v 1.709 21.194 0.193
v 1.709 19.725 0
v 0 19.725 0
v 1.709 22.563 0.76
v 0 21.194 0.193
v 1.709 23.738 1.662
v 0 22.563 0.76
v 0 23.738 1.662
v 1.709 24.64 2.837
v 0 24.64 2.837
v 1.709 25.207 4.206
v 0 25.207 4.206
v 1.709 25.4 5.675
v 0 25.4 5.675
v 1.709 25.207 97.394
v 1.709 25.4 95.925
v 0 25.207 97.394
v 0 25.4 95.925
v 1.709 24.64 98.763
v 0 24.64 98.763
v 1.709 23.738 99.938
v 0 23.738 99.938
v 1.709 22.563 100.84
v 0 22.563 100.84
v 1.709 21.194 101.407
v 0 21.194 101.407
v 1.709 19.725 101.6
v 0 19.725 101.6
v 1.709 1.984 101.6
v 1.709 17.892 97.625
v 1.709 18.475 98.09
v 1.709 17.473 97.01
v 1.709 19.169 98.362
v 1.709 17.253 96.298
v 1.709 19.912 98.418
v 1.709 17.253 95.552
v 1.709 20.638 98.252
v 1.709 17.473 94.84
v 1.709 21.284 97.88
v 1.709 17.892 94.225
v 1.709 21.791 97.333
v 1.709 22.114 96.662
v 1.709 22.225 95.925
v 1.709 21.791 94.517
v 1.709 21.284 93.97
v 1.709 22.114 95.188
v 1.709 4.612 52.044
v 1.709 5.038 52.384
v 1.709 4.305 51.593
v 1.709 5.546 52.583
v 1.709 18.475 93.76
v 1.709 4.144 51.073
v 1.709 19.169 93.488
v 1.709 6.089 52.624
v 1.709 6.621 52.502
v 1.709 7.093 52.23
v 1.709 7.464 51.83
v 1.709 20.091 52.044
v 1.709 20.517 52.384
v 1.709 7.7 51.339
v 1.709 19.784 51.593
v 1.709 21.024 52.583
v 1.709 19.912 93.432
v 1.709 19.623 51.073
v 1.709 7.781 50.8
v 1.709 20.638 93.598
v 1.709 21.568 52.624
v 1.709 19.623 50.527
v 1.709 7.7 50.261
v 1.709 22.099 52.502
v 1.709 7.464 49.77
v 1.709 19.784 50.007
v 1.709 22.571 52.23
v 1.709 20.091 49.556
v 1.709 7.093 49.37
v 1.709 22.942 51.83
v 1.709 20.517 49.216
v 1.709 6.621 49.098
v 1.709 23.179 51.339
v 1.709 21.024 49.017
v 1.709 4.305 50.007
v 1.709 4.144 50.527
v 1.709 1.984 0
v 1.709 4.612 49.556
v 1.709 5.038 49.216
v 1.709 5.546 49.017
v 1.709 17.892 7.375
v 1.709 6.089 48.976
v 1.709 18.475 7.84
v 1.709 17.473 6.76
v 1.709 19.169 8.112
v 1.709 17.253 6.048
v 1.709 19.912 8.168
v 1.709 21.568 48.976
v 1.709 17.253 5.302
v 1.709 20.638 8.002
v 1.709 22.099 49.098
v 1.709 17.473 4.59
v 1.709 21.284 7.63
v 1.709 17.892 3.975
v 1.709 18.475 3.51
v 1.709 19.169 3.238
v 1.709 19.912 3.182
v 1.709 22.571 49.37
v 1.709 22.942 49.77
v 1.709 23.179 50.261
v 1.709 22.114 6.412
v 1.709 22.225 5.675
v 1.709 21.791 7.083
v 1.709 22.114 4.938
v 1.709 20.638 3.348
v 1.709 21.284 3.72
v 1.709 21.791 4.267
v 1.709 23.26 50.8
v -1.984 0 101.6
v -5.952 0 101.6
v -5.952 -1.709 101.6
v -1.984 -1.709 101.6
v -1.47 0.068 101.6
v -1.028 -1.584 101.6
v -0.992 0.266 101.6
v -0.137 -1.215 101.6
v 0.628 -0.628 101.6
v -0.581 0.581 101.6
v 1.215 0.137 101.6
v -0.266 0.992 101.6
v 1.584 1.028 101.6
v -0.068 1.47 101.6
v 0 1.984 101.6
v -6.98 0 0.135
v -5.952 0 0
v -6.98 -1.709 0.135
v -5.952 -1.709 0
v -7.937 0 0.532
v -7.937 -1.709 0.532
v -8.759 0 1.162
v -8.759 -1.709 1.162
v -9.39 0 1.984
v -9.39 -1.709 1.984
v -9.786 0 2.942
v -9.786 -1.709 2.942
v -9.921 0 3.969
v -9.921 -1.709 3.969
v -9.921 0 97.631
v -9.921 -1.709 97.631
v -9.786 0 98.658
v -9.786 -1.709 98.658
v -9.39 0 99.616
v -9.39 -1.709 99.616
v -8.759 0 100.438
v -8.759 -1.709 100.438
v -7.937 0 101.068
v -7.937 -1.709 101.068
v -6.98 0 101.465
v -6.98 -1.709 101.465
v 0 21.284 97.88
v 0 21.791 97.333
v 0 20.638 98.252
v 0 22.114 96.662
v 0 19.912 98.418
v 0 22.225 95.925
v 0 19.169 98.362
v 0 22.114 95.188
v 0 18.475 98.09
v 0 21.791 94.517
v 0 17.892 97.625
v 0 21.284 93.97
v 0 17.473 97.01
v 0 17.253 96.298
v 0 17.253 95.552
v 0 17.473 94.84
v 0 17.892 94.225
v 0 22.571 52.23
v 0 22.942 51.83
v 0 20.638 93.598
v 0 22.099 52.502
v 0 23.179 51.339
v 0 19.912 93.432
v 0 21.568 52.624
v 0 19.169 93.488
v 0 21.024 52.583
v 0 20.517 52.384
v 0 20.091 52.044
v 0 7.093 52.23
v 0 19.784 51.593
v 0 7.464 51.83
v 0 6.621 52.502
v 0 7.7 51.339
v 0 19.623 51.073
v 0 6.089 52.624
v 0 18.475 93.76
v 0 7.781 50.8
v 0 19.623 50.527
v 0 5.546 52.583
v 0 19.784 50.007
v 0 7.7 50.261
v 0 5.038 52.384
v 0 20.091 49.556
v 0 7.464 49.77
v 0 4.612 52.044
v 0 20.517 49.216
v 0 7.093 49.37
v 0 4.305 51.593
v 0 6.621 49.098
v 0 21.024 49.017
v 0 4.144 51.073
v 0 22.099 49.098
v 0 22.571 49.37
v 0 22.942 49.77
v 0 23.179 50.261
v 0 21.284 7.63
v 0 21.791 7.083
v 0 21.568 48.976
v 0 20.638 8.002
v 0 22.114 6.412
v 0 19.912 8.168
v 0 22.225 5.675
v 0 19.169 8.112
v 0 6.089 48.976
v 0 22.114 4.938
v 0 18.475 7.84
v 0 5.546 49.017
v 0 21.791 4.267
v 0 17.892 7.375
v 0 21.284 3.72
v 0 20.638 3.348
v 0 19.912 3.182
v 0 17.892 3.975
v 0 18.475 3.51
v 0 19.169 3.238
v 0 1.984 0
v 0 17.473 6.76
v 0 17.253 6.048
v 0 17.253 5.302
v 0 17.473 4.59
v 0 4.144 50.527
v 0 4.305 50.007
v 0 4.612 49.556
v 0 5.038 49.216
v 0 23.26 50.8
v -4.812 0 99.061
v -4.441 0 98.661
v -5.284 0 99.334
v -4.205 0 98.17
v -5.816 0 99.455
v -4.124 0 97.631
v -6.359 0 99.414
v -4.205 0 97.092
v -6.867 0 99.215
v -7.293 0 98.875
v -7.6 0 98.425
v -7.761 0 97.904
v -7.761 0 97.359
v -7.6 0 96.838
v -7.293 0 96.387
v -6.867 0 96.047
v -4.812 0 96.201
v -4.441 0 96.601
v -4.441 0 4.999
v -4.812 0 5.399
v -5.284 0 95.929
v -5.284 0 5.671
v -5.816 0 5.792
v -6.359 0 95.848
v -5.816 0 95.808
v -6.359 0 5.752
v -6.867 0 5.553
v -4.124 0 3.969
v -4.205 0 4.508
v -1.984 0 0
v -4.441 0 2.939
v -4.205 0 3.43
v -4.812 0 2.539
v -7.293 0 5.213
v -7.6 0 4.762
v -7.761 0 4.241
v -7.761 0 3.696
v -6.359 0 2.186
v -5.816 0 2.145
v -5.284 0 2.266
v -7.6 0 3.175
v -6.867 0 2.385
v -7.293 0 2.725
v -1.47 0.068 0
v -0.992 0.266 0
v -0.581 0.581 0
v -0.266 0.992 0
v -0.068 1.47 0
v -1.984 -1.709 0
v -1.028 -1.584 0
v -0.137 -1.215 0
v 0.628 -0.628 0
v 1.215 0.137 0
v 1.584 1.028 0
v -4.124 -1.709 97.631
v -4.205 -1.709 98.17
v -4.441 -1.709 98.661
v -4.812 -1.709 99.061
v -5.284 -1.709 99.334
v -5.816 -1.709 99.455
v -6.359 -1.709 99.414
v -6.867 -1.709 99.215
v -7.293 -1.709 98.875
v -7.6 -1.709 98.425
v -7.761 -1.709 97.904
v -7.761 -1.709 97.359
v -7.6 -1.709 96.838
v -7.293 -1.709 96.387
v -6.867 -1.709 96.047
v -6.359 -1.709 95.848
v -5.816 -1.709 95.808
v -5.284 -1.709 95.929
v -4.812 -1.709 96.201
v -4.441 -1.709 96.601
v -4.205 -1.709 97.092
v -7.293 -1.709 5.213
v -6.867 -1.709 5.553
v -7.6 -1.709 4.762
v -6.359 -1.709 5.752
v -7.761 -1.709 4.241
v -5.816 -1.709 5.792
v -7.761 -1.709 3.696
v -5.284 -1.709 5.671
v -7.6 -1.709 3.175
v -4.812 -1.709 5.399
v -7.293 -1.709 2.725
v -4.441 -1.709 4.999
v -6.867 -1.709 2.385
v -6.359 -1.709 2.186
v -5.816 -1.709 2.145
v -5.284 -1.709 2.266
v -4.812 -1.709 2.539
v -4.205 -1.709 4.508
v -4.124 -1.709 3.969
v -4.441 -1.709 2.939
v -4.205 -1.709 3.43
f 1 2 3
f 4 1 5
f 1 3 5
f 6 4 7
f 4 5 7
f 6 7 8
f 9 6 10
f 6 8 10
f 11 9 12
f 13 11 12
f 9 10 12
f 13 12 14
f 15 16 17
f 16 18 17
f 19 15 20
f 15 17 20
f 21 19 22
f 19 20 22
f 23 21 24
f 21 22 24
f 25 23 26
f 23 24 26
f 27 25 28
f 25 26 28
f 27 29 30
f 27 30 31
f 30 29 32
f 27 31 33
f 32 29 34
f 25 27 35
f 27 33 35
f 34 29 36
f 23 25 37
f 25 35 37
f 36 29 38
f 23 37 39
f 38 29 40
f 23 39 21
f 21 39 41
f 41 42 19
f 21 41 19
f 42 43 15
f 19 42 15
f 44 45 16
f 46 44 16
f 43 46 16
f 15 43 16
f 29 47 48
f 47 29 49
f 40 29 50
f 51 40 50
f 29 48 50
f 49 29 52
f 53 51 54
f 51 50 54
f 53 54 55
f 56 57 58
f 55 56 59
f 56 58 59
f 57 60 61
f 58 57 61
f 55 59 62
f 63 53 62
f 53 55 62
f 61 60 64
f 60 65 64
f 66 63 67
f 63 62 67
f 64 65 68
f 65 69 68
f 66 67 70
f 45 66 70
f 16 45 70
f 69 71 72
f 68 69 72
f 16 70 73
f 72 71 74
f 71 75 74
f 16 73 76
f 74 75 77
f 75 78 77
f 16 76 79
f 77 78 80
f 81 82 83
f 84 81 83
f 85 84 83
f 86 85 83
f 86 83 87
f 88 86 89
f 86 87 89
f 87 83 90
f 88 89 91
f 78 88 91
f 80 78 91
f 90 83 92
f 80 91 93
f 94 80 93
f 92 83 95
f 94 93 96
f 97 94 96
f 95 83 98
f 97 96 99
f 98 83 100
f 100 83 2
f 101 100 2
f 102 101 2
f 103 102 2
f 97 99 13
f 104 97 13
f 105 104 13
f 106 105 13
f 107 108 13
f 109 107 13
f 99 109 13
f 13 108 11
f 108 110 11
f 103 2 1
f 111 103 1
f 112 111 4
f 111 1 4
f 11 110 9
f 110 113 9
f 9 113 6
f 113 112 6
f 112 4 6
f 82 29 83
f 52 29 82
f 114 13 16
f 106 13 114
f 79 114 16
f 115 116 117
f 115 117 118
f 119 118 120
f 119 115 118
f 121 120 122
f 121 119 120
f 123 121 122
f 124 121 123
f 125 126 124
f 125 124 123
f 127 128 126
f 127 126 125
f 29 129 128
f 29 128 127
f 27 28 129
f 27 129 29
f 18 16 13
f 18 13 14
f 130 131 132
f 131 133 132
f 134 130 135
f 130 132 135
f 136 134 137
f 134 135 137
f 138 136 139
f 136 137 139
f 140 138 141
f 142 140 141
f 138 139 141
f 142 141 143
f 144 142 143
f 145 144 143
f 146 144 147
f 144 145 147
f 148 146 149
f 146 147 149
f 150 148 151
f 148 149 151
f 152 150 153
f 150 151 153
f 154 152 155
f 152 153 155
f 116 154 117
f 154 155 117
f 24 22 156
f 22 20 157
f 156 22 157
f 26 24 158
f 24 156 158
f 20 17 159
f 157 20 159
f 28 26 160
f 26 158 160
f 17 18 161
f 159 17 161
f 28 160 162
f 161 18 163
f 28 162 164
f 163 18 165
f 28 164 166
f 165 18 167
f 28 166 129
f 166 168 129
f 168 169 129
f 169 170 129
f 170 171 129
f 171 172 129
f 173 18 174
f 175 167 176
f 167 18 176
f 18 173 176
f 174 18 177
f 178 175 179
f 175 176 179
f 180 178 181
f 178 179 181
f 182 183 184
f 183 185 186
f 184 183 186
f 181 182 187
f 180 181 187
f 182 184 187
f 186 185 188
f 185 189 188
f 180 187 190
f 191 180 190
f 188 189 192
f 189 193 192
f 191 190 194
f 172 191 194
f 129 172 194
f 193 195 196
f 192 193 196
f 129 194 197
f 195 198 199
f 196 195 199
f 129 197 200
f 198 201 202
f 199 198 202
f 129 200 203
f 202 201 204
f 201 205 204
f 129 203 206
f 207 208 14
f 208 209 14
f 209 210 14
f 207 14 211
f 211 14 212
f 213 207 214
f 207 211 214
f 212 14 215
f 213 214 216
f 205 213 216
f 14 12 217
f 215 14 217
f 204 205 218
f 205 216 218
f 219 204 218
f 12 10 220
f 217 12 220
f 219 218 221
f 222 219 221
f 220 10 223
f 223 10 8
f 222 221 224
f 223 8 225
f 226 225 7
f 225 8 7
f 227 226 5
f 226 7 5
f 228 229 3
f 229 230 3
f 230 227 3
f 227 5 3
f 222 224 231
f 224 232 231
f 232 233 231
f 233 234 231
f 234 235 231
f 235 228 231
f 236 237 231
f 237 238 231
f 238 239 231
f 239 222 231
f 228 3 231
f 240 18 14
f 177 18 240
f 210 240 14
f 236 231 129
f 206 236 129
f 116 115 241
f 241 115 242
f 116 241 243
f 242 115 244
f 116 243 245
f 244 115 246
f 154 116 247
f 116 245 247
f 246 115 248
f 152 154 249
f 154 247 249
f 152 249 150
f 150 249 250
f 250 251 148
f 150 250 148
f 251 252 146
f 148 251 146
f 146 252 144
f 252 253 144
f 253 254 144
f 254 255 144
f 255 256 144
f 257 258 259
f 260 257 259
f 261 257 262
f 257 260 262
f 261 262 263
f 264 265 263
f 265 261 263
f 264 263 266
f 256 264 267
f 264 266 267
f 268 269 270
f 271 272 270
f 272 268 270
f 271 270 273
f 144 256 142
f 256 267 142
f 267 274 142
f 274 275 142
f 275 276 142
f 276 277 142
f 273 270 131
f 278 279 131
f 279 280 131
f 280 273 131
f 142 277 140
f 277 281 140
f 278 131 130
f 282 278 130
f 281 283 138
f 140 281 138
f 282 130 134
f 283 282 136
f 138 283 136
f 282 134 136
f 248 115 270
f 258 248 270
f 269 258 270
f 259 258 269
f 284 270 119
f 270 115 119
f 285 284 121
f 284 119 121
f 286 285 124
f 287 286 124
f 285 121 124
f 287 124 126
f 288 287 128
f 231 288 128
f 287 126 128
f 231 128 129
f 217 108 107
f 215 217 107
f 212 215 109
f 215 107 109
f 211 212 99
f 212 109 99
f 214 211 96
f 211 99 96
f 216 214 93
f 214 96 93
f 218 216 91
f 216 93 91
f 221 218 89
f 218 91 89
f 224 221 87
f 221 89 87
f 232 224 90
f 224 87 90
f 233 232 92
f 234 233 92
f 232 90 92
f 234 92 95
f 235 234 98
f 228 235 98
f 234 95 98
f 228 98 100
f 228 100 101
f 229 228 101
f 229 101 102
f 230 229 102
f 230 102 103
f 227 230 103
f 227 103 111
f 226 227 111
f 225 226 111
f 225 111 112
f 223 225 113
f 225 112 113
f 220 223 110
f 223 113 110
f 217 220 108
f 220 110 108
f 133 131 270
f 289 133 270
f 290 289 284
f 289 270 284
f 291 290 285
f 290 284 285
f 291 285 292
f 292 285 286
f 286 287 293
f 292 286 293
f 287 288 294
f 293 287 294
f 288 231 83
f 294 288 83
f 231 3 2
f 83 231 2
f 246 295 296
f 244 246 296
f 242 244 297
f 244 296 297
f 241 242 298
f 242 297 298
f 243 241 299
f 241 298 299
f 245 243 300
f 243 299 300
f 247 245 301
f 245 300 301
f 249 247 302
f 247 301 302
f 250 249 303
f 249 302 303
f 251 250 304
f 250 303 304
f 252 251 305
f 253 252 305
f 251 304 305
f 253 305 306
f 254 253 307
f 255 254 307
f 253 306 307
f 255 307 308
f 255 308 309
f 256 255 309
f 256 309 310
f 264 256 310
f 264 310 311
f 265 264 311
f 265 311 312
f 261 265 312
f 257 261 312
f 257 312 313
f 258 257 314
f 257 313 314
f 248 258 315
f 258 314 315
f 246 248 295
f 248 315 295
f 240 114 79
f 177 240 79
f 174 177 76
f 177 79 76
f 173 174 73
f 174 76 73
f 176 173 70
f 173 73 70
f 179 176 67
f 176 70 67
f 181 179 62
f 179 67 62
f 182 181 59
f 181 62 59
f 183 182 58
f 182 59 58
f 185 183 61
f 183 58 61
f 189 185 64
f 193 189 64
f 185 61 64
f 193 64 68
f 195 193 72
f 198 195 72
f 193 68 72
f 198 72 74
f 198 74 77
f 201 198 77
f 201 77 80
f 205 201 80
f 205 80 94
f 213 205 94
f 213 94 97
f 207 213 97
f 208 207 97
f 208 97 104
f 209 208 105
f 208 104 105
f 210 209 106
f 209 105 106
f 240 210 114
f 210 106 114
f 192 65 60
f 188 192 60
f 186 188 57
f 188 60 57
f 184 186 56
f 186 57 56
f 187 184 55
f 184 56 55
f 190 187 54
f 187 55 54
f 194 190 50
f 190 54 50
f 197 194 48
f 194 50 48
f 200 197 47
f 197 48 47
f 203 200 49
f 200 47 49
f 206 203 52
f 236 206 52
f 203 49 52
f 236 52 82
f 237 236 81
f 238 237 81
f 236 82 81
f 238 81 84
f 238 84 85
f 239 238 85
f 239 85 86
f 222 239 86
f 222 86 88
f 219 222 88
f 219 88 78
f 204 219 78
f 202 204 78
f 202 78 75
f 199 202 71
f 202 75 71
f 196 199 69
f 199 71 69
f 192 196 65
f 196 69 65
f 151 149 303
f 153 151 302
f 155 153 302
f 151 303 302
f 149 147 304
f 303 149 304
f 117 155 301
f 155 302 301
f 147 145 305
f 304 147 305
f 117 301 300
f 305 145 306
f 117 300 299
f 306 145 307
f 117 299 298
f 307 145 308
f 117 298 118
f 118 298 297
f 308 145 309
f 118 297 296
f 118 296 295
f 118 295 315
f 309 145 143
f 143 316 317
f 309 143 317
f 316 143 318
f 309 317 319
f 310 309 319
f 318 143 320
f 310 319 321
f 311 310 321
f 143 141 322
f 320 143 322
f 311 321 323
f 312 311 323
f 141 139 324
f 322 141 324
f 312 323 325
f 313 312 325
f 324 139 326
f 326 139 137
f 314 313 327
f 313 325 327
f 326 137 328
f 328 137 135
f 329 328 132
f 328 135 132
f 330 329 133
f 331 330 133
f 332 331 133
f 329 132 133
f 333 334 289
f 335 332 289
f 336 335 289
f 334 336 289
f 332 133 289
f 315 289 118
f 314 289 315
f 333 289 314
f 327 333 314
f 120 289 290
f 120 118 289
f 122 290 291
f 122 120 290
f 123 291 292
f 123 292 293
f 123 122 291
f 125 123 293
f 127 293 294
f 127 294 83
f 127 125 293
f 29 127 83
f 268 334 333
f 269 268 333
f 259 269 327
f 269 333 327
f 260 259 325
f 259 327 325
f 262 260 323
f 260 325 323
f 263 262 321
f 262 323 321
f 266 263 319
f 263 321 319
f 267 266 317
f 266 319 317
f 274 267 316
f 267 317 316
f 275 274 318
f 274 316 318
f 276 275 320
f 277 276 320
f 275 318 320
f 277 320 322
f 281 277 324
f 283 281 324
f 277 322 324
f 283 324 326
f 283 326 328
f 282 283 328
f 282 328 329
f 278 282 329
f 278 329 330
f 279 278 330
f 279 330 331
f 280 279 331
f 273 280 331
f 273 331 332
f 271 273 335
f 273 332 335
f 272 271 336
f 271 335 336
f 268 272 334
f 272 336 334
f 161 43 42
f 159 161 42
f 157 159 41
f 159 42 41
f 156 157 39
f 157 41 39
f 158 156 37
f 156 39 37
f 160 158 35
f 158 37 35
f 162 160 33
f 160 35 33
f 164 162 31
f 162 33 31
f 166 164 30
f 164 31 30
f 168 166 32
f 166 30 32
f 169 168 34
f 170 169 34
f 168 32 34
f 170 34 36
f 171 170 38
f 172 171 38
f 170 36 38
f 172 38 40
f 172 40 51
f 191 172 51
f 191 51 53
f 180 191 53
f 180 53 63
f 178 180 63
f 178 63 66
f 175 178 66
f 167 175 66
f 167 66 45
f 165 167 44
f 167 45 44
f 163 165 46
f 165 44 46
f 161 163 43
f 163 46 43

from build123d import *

# Parameters (mm, degrees)
F1_DEPTH = 101.6
F2_R     = 3.69316
F3_R     = 1.98374
F4_R     = 1.8288
F4_R_2   = 2.5
F5_DEPTH = 1.70942
F6_R     = 5.674995
F7_R     = 3.96875
F8_R     = 1.8288
F9_DEPTH = 1.70942


with BuildPart() as f1:
    # F0 (on Top) → F1 (new body)
    with BuildSketch(Plane.XY):
        Polygon((0, 25.4), (0, 0), (-9.92124, 0), (-9.92124, -1.70942), (1.70942, -1.70942), (1.70942, 25.4), align=None)
    extrude(amount=F1_DEPTH)

    # F2
    f2_edges = [f1.edges().sort_by_distance(p)[0] for p in [
        (1.70942, -1.70942, 50.8),
    ]]
    fillet(f2_edges, radius=F2_R)

    # F3
    f3_edges = [f1.edges().sort_by_distance(p)[0] for p in [
        (0, 0, 50.8),
    ]]
    fillet(f3_edges, radius=F3_R)

    # F4 (on face) → F5 (cut, through all)
    with BuildSketch(Plane.YZ.offset(1.70942)):
        with Locations((21.43125, 50.8)):
            Circle(F4_R)
        with Locations((5.95249, 50.8)):
            Circle(F4_R)
        with Locations((19.725, 95.925)):
            Circle(F4_R_2)
        with Locations((19.725, 5.675)):
            Circle(F4_R_2)
    extrude(amount=-F5_DEPTH, mode=Mode.SUBTRACT)

    # F6
    f6_edges = [f1.edges().sort_by_distance(p)[0] for p in [
        (0.85471, 25.4, 101.6),
        (0.85471, 25.4, 0),
    ]]
    fillet(f6_edges, radius=F6_R)

    # F7
    f7_edges = [f1.edges().sort_by_distance(p)[0] for p in [
        (-9.92124, -0.85471, 0),
        (-9.92124, -0.85471, 101.6),
    ]]
    fillet(f7_edges, radius=F7_R)

    # F8 (on face) → F9 (cut, through all)
    with BuildSketch(Plane.XZ.offset(1.70942)):
        with Locations((-5.95249, 97.63125)):
            Circle(F8_R)
        with Locations((-5.95249, 3.96875)):
            Circle(F8_R)
    extrude(amount=-F9_DEPTH, mode=Mode.SUBTRACT)


solid = f1.part
